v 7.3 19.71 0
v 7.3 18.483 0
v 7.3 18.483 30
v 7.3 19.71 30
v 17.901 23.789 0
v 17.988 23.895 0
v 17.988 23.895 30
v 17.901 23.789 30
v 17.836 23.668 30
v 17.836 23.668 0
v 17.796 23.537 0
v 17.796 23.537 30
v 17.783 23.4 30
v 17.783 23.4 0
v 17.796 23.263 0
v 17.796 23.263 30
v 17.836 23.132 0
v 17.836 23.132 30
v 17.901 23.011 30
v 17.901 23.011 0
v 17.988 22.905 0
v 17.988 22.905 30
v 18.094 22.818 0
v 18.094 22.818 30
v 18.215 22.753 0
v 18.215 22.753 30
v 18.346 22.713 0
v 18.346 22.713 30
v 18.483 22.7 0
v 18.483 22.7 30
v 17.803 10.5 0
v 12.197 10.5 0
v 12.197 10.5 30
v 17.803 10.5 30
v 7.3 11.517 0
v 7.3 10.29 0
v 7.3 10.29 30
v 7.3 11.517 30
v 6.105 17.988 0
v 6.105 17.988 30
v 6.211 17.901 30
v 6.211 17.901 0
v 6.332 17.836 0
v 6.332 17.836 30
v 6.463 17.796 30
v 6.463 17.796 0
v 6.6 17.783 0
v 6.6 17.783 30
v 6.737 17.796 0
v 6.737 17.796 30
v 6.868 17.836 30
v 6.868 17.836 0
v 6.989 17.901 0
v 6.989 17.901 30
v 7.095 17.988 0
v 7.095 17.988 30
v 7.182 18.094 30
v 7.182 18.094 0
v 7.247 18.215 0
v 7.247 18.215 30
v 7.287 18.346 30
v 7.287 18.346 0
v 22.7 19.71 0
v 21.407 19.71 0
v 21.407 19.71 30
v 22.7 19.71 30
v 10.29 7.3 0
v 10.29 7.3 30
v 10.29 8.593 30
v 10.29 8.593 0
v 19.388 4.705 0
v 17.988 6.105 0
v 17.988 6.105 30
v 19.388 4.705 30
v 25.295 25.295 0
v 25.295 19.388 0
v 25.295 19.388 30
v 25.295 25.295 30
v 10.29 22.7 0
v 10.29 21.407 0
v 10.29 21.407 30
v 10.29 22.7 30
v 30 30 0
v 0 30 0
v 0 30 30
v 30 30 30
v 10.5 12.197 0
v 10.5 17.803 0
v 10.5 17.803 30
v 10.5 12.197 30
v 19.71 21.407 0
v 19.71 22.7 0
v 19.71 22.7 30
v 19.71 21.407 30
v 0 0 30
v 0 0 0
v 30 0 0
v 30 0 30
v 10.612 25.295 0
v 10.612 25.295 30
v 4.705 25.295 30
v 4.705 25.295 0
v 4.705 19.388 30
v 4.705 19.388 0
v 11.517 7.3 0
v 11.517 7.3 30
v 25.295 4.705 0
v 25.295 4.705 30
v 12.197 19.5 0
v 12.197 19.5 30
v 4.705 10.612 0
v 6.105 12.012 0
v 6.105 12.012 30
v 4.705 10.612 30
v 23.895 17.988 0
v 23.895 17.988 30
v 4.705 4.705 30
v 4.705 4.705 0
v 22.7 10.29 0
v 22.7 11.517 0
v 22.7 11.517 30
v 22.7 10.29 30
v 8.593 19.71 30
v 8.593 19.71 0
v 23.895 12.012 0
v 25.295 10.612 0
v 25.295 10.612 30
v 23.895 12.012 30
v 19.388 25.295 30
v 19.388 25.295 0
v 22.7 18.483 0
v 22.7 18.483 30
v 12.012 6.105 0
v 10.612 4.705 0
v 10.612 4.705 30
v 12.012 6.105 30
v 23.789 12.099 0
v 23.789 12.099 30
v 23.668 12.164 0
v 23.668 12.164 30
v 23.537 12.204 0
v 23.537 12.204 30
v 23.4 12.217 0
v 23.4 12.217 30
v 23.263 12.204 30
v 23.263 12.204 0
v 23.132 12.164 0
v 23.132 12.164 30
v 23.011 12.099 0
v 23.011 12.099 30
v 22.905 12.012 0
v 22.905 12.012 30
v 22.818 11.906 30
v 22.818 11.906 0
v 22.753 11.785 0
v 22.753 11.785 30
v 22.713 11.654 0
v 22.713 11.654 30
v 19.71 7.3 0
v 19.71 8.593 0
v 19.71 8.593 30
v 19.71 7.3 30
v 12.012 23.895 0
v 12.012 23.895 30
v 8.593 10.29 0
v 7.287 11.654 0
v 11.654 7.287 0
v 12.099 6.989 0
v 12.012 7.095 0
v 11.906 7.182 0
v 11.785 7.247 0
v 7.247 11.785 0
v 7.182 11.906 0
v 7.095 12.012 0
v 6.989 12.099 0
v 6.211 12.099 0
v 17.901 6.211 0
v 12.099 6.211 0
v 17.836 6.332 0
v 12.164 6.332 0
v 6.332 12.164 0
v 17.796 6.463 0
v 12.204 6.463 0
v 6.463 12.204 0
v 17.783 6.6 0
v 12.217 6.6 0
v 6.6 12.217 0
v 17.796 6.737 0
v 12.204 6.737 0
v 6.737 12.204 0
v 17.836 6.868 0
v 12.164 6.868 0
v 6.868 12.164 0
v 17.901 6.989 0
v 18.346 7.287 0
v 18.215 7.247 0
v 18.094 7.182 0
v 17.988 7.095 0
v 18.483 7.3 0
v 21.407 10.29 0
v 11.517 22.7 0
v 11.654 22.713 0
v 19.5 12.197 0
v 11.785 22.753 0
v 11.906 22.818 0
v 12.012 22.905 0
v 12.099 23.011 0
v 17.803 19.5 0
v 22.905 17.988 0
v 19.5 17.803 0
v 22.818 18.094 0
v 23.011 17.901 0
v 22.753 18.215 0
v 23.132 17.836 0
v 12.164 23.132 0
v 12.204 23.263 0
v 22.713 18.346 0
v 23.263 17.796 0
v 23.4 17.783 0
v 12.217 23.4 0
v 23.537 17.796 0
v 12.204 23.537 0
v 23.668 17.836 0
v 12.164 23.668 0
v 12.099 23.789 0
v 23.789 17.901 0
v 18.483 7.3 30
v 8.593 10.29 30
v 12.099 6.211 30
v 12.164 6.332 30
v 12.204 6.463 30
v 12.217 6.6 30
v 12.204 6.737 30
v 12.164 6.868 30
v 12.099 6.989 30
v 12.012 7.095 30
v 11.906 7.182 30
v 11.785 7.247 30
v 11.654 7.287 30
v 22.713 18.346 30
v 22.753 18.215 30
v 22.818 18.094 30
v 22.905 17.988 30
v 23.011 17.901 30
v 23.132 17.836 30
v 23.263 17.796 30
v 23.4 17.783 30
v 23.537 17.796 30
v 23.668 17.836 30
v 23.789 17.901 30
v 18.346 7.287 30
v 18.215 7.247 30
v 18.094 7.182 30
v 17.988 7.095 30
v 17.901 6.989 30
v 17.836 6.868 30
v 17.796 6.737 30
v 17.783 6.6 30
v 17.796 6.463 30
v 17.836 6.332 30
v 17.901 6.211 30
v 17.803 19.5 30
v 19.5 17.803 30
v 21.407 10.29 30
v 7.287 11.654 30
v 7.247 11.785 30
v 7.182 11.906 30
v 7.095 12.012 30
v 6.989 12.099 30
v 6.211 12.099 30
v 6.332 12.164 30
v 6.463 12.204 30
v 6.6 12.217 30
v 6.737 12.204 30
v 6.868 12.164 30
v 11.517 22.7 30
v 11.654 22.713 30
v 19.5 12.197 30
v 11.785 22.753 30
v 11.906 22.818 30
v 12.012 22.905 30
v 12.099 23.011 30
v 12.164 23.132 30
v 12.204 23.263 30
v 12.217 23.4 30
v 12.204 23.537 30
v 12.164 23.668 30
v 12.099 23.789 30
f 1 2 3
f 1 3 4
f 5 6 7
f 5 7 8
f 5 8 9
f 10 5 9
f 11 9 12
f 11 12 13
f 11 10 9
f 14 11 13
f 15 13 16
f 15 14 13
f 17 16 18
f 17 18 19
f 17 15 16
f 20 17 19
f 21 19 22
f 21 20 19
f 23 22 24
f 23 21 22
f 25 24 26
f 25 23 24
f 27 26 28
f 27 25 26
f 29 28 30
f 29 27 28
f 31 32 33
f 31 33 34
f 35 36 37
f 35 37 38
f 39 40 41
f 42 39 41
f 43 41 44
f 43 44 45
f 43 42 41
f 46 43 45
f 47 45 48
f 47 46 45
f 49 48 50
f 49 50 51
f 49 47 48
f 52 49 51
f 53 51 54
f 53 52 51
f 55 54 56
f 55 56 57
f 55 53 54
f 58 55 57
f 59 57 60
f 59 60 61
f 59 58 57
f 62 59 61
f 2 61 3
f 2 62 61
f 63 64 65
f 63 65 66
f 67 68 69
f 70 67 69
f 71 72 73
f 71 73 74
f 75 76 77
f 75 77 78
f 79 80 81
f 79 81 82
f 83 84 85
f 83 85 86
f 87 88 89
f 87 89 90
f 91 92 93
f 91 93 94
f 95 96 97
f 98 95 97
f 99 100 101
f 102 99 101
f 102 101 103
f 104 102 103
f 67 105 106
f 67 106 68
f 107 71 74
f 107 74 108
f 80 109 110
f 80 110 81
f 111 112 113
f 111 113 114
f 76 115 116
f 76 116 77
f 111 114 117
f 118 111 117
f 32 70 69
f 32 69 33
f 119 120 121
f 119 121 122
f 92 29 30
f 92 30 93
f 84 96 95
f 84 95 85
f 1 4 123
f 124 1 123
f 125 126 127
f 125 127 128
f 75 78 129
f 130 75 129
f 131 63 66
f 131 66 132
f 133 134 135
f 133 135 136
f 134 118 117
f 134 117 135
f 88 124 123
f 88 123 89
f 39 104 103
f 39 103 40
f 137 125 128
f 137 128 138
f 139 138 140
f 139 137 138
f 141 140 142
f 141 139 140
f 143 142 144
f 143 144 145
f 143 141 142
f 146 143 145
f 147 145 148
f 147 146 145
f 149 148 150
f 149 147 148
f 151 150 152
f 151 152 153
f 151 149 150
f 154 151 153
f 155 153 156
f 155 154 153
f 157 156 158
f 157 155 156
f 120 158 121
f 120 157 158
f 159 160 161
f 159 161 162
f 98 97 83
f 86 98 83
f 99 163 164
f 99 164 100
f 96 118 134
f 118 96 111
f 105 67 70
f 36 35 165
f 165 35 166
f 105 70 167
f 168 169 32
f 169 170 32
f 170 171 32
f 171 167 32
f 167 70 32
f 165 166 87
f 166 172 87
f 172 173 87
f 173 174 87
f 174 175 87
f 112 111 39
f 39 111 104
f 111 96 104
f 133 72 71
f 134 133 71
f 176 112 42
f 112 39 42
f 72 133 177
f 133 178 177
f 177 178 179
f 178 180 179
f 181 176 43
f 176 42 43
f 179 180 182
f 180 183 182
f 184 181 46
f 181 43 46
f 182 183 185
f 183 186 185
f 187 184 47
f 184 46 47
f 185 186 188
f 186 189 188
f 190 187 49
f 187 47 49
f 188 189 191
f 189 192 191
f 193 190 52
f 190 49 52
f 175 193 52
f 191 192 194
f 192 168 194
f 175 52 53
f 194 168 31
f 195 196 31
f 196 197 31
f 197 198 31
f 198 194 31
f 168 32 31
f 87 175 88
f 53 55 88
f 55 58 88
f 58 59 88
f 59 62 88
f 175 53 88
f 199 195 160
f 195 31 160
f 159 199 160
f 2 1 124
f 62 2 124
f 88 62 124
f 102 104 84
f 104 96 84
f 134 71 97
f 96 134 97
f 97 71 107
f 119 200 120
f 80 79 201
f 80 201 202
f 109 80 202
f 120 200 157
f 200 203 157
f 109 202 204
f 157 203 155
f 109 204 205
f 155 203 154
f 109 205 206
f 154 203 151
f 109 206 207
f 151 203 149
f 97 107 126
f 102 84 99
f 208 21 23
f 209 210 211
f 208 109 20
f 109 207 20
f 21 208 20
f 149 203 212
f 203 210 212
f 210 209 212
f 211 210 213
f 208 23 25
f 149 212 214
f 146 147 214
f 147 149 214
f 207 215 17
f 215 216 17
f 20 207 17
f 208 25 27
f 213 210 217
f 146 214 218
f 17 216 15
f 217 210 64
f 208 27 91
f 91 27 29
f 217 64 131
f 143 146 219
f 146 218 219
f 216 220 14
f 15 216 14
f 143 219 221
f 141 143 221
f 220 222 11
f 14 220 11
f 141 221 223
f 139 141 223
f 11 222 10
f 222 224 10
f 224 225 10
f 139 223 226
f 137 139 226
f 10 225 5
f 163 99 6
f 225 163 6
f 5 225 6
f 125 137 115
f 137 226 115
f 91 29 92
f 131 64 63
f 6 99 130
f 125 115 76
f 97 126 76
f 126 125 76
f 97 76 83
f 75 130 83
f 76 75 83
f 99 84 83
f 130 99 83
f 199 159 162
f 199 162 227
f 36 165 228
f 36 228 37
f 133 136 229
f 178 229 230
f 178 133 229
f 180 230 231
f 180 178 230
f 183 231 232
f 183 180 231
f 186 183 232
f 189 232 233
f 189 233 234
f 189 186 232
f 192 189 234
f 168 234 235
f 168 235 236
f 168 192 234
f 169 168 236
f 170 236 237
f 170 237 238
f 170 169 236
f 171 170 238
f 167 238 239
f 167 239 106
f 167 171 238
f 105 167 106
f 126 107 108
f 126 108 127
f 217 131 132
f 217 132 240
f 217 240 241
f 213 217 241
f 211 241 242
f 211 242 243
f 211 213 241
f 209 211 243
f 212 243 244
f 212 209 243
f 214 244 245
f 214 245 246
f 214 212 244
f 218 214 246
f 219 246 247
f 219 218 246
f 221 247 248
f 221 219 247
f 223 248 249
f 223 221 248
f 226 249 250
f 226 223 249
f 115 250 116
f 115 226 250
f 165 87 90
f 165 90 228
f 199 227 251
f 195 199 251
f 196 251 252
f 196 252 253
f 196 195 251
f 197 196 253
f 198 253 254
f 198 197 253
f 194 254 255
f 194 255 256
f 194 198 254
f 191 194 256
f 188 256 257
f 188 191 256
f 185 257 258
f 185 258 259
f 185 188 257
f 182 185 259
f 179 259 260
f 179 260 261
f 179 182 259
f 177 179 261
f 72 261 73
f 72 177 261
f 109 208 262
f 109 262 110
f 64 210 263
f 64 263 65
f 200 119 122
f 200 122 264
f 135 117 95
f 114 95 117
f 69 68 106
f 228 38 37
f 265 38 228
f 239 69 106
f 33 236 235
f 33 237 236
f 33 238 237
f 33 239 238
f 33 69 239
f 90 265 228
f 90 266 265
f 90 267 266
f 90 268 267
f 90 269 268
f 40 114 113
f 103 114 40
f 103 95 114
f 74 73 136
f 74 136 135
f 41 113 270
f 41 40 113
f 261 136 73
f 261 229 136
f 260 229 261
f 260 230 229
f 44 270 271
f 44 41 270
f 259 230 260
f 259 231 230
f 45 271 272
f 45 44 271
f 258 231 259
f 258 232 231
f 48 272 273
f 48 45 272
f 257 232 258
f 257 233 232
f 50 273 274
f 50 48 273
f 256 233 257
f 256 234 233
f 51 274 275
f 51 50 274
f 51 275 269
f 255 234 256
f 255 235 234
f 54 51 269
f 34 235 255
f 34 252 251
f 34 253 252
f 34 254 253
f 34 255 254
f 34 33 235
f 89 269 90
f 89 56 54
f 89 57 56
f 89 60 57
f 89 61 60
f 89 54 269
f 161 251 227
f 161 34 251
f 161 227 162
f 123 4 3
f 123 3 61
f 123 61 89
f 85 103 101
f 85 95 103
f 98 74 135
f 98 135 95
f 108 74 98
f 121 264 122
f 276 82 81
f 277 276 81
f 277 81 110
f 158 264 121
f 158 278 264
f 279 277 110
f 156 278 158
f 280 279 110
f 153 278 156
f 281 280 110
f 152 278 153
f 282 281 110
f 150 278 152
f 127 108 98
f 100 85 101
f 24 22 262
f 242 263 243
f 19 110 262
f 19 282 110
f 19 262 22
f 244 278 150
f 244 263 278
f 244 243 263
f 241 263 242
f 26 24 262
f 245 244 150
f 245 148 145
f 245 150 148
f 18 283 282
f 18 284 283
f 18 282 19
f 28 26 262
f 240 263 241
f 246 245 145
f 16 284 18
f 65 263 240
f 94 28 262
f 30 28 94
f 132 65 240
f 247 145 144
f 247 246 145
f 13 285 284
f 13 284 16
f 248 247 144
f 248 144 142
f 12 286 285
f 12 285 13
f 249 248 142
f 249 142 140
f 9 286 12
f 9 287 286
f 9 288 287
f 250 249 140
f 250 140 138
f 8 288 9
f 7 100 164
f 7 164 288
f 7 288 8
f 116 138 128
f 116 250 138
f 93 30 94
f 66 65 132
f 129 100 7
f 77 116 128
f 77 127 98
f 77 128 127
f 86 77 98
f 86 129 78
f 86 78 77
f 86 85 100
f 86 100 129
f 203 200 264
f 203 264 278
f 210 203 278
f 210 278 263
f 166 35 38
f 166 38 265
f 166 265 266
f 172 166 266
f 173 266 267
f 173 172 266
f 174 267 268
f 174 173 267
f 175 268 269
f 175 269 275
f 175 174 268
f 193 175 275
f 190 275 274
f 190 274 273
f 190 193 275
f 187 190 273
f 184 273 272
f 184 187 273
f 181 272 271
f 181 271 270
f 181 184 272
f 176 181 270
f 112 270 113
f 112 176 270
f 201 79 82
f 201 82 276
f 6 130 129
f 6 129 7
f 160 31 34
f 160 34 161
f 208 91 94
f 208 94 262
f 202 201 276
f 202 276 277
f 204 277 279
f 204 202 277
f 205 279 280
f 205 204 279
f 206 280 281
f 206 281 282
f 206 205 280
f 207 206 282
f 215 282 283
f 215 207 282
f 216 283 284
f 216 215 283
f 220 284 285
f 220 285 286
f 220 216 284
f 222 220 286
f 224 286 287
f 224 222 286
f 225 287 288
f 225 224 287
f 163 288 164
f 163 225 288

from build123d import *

# Parameters (mm, degrees)
SKETCH1_W           = 30
SKETCH1_H           = 30
BOSS_EXTRUDE1_DEPTH = 30


with BuildPart() as part:
    # Sketch1 → Boss-Extrude1 (new body)
    with BuildSketch(Plane.XY):
        with Locations((15, 15)):
            Rectangle(SKETCH1_W, SKETCH1_H)
        with BuildLine():
            Line((17.802943725, 19.5), (12.197056275, 19.5))
            Line((12.197056275, 19.5), (10.289949494, 21.407106781))
            Line((10.289949494, 21.407106781), (10.289949494, 22.7))
            Line((10.289949494, 22.7), (11.517157288, 22.7))
            ThreePointArc((11.517157288, 22.7), (12.16387296, 23.132121597), (12.012132034, 23.894974747))
            Line((12.012132034, 23.894974747), (10.612132034, 25.294974747))
            Line((10.612132034, 25.294974747), (4.705025253, 25.294974747))
            Line((4.705025253, 25.294974747), (4.705025253, 19.387867966))
            Line((4.705025253, 19.387867966), (6.105025253, 17.987867966))
            ThreePointArc((6.105025253, 17.987867966), (6.867878403, 17.83612704), (7.3, 18.482842712))
            Line((7.3, 18.482842712), (7.3, 19.710050506))
            Line((7.3, 19.710050506), (8.592893219, 19.710050506))
            Line((8.592893219, 19.710050506), (10.5, 17.802943725))
            Line((10.5, 17.802943725), (10.5, 12.197056275))
            Line((10.5, 12.197056275), (8.592893219, 10.289949494))
            Line((8.592893219, 10.289949494), (7.3, 10.289949494))
            Line((7.3, 10.289949494), (7.3, 11.517157288))
            ThreePointArc((7.3, 11.517157288), (6.867878403, 12.16387296), (6.105025253, 12.012132034))
            Line((6.105025253, 12.012132034), (4.705025253, 10.612132034))
            Line((4.705025253, 10.612132034), (4.705025253, 4.705025253))
            Line((4.705025253, 4.705025253), (10.612132034, 4.705025253))
            Line((10.612132034, 4.705025253), (12.012132034, 6.105025253))
            ThreePointArc((12.012132034, 6.105025253), (12.16387296, 6.867878403), (11.517157288, 7.3))
            Line((11.517157288, 7.3), (10.289949494, 7.3))
            Line((10.289949494, 7.3), (10.289949494, 8.592893219))
            Line((10.289949494, 8.592893219), (12.197056275, 10.5))
            Line((12.197056275, 10.5), (17.802943725, 10.5))
            Line((17.802943725, 10.5), (19.710050506, 8.592893219))
            Line((19.710050506, 8.592893219), (19.710050506, 7.3))
            Line((19.710050506, 7.3), (18.482842712, 7.3))
            ThreePointArc((18.482842712, 7.3), (17.83612704, 6.867878403), (17.987867966, 6.105025253))
            Line((17.987867966, 6.105025253), (19.387867966, 4.705025253))
            Line((19.387867966, 4.705025253), (25.294974747, 4.705025253))
            Line((25.294974747, 4.705025253), (25.294974747, 10.612132034))
            Line((25.294974747, 10.612132034), (23.894974747, 12.012132034))
            ThreePointArc((23.894974747, 12.012132034), (23.132121597, 12.16387296), (22.7, 11.517157288))
            Line((22.7, 11.517157288), (22.7, 10.289949494))
            Line((22.7, 10.289949494), (21.407106781, 10.289949494))
            Line((21.407106781, 10.289949494), (19.5, 12.197056275))
            Line((19.5, 12.197056275), (19.5, 17.802943725))
            Line((19.5, 17.802943725), (21.407106781, 19.710050506))
            Line((21.407106781, 19.710050506), (22.7, 19.710050506))
            Line((22.7, 19.710050506), (22.7, 18.482842712))
            ThreePointArc((22.7, 18.482842712), (23.132121597, 17.83612704), (23.894974747, 17.987867966))
            Line((23.894974747, 17.987867966), (25.294974747, 19.387867966))
            Line((25.294974747, 19.387867966), (25.294974747, 25.294974747))
            Line((25.294974747, 25.294974747), (19.387867966, 25.294974747))
            Line((19.387867966, 25.294974747), (17.987867966, 23.894974747))
            ThreePointArc((17.987867966, 23.894974747), (17.83612704, 23.132121597), (18.482842712, 22.7))
            Line((18.482842712, 22.7), (19.710050506, 22.7))
            Line((19.710050506, 22.7), (19.710050506, 21.407106781))
            Line((19.710050506, 21.407106781), (17.802943725, 19.5))
        make_face(mode=Mode.SUBTRACT)
    extrude(amount=BOSS_EXTRUDE1_DEPTH)


solid = part.part
